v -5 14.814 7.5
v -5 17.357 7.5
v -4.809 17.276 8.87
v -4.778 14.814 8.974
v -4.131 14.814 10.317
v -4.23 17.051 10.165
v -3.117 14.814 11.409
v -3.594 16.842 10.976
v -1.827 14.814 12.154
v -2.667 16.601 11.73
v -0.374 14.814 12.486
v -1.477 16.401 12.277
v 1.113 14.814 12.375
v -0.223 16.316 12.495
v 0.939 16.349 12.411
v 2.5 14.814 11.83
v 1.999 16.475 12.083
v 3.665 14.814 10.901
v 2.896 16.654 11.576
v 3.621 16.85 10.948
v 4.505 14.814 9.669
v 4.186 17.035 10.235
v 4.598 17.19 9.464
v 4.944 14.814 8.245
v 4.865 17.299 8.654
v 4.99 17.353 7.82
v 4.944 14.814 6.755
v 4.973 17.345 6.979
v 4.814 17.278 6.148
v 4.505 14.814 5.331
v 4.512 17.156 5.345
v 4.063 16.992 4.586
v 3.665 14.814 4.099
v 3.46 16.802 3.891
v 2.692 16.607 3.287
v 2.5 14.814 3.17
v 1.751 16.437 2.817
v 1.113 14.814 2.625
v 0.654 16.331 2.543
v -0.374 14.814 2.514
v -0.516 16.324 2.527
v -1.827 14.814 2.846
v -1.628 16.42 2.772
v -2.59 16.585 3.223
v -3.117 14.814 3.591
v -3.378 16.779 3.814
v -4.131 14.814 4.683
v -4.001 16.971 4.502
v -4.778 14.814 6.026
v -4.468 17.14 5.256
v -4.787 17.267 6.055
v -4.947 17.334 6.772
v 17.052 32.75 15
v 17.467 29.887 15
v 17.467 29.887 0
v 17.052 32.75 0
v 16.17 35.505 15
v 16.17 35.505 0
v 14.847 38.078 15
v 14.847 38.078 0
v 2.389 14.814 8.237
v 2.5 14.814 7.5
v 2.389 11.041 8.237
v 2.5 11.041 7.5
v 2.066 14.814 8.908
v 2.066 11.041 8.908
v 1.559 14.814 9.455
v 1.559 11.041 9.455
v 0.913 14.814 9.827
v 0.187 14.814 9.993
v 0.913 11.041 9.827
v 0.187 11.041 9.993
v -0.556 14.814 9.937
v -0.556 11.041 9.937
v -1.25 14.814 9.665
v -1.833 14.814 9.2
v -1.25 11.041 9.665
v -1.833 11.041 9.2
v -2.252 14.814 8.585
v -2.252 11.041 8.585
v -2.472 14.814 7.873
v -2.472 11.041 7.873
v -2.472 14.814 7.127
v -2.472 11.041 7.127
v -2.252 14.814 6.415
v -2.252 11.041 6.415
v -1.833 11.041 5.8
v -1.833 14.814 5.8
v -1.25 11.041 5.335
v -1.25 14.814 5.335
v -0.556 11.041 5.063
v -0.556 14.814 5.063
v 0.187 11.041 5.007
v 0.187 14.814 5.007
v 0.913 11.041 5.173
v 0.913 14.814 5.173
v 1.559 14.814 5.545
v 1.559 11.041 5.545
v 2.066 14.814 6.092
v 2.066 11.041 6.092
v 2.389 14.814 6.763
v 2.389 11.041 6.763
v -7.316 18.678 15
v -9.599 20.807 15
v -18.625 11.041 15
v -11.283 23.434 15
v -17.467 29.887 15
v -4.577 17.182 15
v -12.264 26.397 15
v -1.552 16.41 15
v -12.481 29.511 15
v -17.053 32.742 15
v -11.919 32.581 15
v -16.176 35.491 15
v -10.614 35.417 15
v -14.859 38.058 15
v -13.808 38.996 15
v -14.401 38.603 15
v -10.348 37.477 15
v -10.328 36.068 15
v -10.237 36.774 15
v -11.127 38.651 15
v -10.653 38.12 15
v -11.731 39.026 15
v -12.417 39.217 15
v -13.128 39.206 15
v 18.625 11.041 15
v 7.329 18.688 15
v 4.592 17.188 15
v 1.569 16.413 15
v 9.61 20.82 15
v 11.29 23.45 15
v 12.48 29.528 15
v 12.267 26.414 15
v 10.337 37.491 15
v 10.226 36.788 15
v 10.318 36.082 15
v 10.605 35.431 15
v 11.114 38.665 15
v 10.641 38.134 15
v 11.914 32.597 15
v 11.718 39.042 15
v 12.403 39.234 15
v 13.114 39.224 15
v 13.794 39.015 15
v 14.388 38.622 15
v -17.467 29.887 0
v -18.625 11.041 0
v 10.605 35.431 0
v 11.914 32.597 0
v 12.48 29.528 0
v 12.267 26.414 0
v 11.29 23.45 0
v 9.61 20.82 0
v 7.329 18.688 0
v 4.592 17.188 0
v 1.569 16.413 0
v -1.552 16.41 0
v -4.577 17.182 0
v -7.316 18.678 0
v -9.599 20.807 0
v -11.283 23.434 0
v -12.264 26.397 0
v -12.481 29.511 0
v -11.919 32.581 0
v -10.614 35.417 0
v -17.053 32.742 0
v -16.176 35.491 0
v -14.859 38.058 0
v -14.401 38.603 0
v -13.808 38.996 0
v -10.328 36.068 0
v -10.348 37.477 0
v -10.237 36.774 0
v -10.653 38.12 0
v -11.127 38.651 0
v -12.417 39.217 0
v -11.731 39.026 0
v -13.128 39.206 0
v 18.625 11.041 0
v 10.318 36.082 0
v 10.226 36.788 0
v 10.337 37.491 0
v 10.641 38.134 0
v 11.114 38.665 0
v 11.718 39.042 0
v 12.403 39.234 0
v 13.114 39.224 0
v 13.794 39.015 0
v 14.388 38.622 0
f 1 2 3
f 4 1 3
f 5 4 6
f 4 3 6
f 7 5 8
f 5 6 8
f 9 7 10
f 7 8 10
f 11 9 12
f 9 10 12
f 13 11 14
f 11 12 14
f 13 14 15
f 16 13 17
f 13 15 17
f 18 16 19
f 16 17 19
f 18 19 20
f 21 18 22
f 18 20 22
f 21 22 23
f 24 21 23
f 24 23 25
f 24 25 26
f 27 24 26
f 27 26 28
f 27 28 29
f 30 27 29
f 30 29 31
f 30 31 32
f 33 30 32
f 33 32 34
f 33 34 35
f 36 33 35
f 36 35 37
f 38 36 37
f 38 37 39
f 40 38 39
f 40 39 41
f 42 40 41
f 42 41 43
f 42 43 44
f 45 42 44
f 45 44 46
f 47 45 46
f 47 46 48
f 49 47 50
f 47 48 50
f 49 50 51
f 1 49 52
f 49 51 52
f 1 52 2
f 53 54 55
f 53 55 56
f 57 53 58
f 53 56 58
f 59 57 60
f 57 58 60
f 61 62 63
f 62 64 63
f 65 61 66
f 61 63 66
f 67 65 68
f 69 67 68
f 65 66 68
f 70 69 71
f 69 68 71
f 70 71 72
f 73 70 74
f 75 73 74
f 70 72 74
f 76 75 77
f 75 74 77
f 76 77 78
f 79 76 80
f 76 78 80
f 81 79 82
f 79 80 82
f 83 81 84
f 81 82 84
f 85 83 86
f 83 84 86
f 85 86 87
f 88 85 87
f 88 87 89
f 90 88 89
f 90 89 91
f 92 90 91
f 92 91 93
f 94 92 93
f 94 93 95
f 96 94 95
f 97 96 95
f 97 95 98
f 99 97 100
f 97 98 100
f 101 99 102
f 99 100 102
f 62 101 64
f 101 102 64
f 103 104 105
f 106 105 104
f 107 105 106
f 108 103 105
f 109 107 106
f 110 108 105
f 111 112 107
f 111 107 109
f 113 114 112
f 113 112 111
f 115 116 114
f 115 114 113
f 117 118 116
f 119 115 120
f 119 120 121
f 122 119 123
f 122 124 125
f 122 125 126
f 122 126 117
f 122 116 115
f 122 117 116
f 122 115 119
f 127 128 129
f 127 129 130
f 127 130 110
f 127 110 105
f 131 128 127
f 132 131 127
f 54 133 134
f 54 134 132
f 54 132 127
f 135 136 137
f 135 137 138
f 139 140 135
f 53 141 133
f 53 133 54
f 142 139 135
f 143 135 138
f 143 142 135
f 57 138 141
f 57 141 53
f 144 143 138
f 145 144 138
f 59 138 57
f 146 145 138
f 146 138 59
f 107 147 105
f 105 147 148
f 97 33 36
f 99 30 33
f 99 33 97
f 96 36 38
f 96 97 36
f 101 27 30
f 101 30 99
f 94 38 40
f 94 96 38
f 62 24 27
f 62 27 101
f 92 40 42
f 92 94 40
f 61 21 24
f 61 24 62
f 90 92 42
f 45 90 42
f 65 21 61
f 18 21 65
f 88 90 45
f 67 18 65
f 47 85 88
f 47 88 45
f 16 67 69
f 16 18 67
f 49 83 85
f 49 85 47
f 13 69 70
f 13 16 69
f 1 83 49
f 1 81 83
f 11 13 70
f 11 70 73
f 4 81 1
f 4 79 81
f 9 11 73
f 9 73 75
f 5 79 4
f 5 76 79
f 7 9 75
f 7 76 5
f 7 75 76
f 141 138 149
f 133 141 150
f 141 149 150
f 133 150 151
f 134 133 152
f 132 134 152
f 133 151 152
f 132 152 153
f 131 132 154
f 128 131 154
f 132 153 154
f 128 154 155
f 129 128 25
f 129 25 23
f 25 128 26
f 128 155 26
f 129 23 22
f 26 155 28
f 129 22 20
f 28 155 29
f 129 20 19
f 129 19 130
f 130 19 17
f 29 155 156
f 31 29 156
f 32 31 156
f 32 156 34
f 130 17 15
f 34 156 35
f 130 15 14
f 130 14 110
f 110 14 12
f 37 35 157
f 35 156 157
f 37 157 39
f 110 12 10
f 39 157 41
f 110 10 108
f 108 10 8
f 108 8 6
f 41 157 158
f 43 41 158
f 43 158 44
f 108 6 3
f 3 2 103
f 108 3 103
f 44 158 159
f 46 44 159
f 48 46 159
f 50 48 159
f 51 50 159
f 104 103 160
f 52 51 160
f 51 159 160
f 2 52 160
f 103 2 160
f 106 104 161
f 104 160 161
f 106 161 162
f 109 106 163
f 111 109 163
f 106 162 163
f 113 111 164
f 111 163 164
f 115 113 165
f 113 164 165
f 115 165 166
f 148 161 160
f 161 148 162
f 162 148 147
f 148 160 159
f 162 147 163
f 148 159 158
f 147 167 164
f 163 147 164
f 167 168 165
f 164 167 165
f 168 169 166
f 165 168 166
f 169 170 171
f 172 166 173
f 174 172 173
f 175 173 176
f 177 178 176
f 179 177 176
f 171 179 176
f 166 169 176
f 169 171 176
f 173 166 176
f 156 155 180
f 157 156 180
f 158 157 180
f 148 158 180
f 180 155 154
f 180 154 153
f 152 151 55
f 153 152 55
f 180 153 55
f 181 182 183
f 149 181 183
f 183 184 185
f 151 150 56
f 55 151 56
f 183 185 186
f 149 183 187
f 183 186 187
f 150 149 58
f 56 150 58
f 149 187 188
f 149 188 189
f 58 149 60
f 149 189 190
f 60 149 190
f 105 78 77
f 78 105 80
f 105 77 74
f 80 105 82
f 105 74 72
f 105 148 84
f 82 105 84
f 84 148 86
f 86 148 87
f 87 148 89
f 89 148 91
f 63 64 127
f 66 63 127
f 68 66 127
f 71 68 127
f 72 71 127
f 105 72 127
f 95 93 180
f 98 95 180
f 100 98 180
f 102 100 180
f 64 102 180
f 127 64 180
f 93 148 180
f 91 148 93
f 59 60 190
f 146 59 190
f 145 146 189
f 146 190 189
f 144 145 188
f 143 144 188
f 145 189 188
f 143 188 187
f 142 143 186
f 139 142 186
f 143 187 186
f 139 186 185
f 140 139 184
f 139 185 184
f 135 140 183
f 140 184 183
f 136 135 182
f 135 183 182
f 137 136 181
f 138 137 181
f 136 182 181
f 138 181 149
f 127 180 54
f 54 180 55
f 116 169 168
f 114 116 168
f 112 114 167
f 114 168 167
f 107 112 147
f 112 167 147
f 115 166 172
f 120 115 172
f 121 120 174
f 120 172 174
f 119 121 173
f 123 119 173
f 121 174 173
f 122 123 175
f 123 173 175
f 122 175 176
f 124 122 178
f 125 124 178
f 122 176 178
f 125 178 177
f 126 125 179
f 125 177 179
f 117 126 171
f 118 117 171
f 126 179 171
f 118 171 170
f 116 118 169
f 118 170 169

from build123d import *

# Parameters (mm, degrees)
F1_DEPTH       = 15
F4_D           = 5
F4_START       = 12.5000001
F4_CBORE_D     = 10
F4_CBORE_DEPTH = 1.5


# Not quite as in the source:
# - a feature of the source that left no trace in its solid (it failed there, or was rolled back) is left out


with BuildPart() as f1:
    # F0 (on Top) → F1 (new body)
    with BuildSketch(Plane.XY):
        with BuildLine():
            ThreePointArc((10.6047668571, 35.4310178135), (0.0084014235, 16.3137009448), (-10.6136524588, 35.4167566161))
            ThreePointArc((-10.6136524588, 35.4167566161), (-11.4157712516, 38.8600988068), (-14.8591134423, 38.057980014))
            ThreePointArc((-14.8591134423, 38.057980014), (-16.6714054435, 34.1348108377), (-17.4670460885, 29.8871509353))
            Line((-17.4670460885, 29.8871509353), (-18.6252595091, 11.0408943146))
            Line((-18.6252595091, 11.0408943146), (18.6252595091, 11.0408943146))
            Line((18.6252595091, 11.0408943146), (17.4670460885, 29.8871509353))
            ThreePointArc((17.4670460885, 29.8871509353), (16.6678252842, 34.1460147189), (14.8466735999, 38.0779456904))
            ThreePointArc((14.8466735999, 38.0779456904), (11.4022562901, 38.8754351234), (10.6047668571, 35.4310178135))
        make_face()
    extrude(amount=F1_DEPTH)

    # F4 (through all)
    # its depths count from where the whole tool has entered the part; down to there all is cleared
    with Locations(Plane(origin=(0, 28.8136981214, 0), x_dir=(-1, 0, 0), z_dir=(0, 1, 0)).offset(-F4_START)):
        with Locations((0, 7.5)):
            CounterBoreHole(F4_D / 2, F4_CBORE_D / 2, F4_CBORE_DEPTH)


solid = f1.part
